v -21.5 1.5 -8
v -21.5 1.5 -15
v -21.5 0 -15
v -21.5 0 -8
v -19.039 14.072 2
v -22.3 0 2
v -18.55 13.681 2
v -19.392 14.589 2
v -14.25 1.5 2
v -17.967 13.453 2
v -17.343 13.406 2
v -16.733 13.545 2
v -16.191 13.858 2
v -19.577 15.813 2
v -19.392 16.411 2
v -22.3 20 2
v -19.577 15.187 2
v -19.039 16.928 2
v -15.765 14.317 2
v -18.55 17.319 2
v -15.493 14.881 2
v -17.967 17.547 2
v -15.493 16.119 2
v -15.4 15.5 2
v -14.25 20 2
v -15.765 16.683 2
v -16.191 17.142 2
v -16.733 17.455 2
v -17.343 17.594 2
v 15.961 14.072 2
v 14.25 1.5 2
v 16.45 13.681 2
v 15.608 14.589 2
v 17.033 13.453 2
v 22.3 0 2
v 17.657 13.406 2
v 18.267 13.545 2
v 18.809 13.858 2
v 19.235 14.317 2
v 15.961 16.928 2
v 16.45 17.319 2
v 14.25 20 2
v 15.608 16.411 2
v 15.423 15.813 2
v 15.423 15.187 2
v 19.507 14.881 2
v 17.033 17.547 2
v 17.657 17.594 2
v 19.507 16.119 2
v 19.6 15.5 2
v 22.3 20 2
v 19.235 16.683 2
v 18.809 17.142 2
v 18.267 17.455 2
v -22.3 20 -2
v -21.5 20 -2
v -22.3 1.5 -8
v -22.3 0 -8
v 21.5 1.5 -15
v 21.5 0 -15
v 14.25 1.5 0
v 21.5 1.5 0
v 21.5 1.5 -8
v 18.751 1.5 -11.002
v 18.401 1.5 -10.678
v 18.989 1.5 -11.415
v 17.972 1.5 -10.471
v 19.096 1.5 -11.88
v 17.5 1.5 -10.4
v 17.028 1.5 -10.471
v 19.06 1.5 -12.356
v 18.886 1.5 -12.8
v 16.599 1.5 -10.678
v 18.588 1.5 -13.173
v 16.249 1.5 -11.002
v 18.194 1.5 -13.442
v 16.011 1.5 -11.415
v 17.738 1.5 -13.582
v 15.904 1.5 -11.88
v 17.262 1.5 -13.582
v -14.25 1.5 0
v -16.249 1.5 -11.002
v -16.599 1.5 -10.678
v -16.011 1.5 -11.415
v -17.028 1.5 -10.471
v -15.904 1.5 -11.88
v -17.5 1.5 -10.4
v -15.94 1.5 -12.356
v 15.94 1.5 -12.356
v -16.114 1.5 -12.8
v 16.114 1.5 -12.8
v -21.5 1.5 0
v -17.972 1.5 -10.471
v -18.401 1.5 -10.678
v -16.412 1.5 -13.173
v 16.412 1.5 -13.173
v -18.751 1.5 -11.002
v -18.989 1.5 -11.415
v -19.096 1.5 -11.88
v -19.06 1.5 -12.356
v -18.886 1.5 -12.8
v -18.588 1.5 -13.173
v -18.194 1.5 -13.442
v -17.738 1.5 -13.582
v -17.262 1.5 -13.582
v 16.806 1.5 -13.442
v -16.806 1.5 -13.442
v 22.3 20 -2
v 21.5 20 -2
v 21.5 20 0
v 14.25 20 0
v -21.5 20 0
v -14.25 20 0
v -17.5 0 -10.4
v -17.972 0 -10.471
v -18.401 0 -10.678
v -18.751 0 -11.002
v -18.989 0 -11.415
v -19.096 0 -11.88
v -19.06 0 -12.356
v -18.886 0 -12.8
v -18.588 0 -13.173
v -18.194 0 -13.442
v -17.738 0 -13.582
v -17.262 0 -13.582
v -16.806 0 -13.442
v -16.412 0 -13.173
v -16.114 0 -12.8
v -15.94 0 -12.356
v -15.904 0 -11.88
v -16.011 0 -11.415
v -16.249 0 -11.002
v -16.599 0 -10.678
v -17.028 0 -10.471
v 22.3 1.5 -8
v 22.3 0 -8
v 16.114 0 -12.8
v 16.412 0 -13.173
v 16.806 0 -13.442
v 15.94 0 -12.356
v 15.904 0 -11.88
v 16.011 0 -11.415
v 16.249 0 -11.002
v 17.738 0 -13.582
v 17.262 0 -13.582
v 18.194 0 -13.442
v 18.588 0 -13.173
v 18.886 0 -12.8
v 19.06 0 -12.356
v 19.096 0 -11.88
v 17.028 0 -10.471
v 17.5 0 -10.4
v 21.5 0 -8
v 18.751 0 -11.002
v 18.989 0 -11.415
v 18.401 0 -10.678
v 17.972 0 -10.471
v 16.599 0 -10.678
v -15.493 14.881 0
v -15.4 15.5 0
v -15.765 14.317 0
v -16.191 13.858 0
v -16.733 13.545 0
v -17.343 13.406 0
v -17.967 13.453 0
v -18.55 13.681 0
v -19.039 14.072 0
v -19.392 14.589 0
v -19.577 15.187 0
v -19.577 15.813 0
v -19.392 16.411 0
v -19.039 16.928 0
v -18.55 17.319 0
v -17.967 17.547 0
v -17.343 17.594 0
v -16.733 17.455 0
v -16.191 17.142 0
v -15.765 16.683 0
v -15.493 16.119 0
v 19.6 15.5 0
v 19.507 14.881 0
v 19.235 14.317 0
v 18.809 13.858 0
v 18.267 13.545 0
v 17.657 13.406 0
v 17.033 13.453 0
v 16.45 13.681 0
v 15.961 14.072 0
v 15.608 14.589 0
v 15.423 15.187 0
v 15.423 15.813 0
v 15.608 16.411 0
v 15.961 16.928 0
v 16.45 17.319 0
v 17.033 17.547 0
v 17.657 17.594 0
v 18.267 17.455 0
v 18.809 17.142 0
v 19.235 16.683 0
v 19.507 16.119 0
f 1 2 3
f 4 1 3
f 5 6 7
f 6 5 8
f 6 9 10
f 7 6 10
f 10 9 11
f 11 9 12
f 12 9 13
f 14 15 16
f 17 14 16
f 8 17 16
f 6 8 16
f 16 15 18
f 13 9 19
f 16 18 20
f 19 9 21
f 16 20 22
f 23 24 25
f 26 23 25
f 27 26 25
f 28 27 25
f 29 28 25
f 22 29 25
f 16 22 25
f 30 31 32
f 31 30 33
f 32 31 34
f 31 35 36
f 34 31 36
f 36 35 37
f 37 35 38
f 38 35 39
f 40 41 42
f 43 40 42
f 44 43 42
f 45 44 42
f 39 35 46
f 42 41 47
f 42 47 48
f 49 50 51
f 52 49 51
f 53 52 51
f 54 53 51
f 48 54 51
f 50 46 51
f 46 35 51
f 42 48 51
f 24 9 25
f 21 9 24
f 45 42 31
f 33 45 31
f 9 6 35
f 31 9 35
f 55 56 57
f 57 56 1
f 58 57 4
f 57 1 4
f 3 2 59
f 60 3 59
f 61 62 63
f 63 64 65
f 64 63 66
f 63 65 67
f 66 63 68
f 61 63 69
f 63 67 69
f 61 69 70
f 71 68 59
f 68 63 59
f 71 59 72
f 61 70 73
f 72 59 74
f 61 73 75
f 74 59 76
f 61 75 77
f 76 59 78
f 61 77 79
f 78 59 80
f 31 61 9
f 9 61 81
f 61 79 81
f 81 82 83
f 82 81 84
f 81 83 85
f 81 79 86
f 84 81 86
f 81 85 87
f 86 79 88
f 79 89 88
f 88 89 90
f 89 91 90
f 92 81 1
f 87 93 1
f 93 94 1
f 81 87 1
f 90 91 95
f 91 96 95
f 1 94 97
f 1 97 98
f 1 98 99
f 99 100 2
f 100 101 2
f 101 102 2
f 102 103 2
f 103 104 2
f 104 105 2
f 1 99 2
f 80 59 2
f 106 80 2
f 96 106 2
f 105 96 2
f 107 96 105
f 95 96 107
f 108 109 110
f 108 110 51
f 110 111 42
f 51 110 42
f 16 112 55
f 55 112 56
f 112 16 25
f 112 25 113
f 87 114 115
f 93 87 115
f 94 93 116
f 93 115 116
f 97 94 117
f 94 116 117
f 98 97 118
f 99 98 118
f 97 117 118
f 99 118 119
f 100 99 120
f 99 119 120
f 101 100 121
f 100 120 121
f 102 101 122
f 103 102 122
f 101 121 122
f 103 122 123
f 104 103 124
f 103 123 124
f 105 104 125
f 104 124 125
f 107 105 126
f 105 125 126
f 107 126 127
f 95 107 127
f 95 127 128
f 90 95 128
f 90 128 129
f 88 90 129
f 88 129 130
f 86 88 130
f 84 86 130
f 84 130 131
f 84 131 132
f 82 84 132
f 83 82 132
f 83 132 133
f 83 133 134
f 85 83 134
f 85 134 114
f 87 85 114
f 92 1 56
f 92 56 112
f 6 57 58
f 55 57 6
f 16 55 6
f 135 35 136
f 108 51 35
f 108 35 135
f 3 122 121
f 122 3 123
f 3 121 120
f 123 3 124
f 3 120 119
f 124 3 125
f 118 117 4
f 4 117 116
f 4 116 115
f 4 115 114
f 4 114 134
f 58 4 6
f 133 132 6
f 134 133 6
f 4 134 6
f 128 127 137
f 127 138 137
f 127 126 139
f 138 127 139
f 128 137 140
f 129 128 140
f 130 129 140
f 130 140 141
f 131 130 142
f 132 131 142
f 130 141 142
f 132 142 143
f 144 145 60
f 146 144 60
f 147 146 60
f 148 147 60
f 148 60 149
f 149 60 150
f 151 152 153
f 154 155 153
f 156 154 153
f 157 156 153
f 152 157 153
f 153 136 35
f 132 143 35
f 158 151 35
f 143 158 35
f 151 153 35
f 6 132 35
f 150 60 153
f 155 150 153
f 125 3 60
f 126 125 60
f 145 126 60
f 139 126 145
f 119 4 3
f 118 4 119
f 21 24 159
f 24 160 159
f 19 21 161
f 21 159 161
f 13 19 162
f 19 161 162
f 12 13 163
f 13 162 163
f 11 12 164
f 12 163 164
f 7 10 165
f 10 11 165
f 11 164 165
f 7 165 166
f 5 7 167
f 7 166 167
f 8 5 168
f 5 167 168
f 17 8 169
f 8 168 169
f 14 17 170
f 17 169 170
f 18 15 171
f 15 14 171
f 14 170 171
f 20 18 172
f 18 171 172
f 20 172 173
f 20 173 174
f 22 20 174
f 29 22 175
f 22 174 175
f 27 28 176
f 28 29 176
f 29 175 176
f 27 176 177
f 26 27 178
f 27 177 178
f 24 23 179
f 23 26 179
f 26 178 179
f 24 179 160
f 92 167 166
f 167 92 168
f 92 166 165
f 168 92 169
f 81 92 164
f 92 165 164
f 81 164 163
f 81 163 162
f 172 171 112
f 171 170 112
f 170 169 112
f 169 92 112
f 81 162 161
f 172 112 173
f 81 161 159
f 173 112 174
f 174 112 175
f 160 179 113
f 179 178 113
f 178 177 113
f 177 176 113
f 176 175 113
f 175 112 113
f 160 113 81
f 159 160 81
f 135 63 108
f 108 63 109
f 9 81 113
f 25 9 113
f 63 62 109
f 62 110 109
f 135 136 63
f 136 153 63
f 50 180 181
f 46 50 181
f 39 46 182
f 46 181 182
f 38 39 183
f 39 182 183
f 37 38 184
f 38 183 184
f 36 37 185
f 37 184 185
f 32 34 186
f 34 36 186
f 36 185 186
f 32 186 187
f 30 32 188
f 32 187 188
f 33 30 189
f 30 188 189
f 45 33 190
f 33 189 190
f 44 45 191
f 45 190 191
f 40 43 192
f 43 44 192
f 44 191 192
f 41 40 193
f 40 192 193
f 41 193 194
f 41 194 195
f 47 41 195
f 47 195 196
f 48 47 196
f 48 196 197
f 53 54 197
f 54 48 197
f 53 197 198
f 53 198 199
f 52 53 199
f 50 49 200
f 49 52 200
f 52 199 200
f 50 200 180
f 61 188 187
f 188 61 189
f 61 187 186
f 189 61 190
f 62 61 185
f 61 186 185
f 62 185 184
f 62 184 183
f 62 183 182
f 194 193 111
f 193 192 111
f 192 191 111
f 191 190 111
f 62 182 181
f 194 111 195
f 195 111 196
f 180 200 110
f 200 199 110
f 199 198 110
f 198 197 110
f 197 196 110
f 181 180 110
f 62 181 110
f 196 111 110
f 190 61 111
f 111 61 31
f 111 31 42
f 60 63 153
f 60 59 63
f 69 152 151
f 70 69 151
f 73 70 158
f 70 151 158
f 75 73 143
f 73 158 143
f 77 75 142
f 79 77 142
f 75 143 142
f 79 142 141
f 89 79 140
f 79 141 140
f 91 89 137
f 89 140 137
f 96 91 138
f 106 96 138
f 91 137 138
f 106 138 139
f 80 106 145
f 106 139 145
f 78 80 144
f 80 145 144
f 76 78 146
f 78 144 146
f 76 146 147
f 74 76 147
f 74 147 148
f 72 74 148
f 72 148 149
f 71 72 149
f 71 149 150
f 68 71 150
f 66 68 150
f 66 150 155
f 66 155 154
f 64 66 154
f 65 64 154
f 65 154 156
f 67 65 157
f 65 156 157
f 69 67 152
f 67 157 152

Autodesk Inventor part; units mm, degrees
ref_plane "YZ Plane" through (0, 0, 0) normal (1, 0, 0) x (0, 1, 0)
ref_plane "XZ Plane" through (0, 0, 0) normal (0, 1, 0) x (-1, 0, 0)
ref_plane "XY Plane" through (0, 0, 0) normal (0, 0, 1) x (1, 0, 0)
sketch "スケッチ1" plane through (0, 0, 0) normal (0, 0, 1) x (1, 0, 0)
  line L0 (0, 0) -> (0, 23.3181) construction
  line L1 (-22.6457, 15.5) -> (22.6457, 15.5) construction
  line L2 (-20.3832, 1.5) -> (20.3832, 1.5) construction
  circle A0 centre (0, 15.5) radius 14 construction
  line L3 (-22.6457, 7.5) -> (22.6457, 7.5) construction
  circle A1 centre (-17.5, 15.5) radius 2.1
  circle A2 centre (17.5, 15.5) radius 2.1
  line L4 (-21.5, 20) -> (-21.5, 0)
  line L5 (-21.5, 0) -> (-14.25, 0)
  line L6 (-14.25, 0) -> (-14.25, 20)
  line L7 (21.5, 20) -> (21.5, 0)
  line L8 (21.5, 0) -> (14.25, 0)
  line L9 (14.25, 0) -> (14.25, 20)
  line L10 (-14.25, 20) -> (-21.5, 20)
  line L11 (14.25, 20) -> (21.5, 20)
  line L12 (21.5, 1.5) -> (-21.5, 1.5)
  line L13 (-21.5, 1.5) -> (-21.5, 0)
  line L14 (-21.5, 0) -> (21.5, 0)
  line L15 (21.5, 0) -> (21.5, 1.5)
  point P0 (0, 1.5)
  point P1 (0, 7.5)
  point P2 (14.25, 1.5)
  point P3 (-14.25, 1.5)
  dimension "d0" = 28
  dimension "d1" = 1.5
  dimension "d2" = 8
  dimension "d3" = 4.2
  dimension "d4" = 35
  dimension "d6" = 20
  dimension "d29" = 3.25
  dimension "d30" = 3.25
  dimension "d31" = 4
  dimension "d32" = 4
extrude "前" add sketch "スケッチ1" along normal blind 2
extrude "底" add sketch "スケッチ1" against normal blind 15 contours L12 L6 L5 L4 | L12 L9 L14 L6 | L12 L7 L8 L9
sketch "スケッチ5" plane through (-14.25, 1.5, 2) normal (0, 1, 0) x (1, 0, 0)
  line L0 (14.25, -6.214) -> (14.25, 25.3742) construction
  line L1 (28.5, 0) -> (0, 0) construction
  point P0 (14.25, 2)
  point P1 (-3.25, 14)
  point P2 (31.75, 14)
  dimension "d33" = 35
  dimension "d34" = 14
hole "穴2" at (-17.5, 1.5, -12) at (17.5, 1.5, -12) direction (0, -1, 0) diameter 3.2 end through all
sketch "スケッチ6" plane through (21.5, 1.5, 0) normal (1, 0, 0) x (0, 0, -1)
  line L0 (2, 18.5) -> (-2, 18.5)
  line L1 (-2, 18.5) -> (-2, 0) projected
  line L2 (-2, 18.5) -> (-2, -1.5)
  line L3 (-2, -1.5) -> (8, -1.5)
  line L4 (8, -1.5) -> (8, 0)
  line L5 (8, 0) -> (2, 18.5)
  point P0 (0, -1.5)
  point P1 (15, 0)
  dimension "d42" = 4
  dimension "d43" = 10
extrude "押し出し5" add sketch "スケッチ6" along normal blind 0.8
mirror "ミラー3" about plane through (0, 0, 0) normal (1, 0, 0) of "押し出し5"
equation "\"d30\" = d29"
equation "\"d32\" = d31"
properties part number "28BYJ-48_Braket2"
